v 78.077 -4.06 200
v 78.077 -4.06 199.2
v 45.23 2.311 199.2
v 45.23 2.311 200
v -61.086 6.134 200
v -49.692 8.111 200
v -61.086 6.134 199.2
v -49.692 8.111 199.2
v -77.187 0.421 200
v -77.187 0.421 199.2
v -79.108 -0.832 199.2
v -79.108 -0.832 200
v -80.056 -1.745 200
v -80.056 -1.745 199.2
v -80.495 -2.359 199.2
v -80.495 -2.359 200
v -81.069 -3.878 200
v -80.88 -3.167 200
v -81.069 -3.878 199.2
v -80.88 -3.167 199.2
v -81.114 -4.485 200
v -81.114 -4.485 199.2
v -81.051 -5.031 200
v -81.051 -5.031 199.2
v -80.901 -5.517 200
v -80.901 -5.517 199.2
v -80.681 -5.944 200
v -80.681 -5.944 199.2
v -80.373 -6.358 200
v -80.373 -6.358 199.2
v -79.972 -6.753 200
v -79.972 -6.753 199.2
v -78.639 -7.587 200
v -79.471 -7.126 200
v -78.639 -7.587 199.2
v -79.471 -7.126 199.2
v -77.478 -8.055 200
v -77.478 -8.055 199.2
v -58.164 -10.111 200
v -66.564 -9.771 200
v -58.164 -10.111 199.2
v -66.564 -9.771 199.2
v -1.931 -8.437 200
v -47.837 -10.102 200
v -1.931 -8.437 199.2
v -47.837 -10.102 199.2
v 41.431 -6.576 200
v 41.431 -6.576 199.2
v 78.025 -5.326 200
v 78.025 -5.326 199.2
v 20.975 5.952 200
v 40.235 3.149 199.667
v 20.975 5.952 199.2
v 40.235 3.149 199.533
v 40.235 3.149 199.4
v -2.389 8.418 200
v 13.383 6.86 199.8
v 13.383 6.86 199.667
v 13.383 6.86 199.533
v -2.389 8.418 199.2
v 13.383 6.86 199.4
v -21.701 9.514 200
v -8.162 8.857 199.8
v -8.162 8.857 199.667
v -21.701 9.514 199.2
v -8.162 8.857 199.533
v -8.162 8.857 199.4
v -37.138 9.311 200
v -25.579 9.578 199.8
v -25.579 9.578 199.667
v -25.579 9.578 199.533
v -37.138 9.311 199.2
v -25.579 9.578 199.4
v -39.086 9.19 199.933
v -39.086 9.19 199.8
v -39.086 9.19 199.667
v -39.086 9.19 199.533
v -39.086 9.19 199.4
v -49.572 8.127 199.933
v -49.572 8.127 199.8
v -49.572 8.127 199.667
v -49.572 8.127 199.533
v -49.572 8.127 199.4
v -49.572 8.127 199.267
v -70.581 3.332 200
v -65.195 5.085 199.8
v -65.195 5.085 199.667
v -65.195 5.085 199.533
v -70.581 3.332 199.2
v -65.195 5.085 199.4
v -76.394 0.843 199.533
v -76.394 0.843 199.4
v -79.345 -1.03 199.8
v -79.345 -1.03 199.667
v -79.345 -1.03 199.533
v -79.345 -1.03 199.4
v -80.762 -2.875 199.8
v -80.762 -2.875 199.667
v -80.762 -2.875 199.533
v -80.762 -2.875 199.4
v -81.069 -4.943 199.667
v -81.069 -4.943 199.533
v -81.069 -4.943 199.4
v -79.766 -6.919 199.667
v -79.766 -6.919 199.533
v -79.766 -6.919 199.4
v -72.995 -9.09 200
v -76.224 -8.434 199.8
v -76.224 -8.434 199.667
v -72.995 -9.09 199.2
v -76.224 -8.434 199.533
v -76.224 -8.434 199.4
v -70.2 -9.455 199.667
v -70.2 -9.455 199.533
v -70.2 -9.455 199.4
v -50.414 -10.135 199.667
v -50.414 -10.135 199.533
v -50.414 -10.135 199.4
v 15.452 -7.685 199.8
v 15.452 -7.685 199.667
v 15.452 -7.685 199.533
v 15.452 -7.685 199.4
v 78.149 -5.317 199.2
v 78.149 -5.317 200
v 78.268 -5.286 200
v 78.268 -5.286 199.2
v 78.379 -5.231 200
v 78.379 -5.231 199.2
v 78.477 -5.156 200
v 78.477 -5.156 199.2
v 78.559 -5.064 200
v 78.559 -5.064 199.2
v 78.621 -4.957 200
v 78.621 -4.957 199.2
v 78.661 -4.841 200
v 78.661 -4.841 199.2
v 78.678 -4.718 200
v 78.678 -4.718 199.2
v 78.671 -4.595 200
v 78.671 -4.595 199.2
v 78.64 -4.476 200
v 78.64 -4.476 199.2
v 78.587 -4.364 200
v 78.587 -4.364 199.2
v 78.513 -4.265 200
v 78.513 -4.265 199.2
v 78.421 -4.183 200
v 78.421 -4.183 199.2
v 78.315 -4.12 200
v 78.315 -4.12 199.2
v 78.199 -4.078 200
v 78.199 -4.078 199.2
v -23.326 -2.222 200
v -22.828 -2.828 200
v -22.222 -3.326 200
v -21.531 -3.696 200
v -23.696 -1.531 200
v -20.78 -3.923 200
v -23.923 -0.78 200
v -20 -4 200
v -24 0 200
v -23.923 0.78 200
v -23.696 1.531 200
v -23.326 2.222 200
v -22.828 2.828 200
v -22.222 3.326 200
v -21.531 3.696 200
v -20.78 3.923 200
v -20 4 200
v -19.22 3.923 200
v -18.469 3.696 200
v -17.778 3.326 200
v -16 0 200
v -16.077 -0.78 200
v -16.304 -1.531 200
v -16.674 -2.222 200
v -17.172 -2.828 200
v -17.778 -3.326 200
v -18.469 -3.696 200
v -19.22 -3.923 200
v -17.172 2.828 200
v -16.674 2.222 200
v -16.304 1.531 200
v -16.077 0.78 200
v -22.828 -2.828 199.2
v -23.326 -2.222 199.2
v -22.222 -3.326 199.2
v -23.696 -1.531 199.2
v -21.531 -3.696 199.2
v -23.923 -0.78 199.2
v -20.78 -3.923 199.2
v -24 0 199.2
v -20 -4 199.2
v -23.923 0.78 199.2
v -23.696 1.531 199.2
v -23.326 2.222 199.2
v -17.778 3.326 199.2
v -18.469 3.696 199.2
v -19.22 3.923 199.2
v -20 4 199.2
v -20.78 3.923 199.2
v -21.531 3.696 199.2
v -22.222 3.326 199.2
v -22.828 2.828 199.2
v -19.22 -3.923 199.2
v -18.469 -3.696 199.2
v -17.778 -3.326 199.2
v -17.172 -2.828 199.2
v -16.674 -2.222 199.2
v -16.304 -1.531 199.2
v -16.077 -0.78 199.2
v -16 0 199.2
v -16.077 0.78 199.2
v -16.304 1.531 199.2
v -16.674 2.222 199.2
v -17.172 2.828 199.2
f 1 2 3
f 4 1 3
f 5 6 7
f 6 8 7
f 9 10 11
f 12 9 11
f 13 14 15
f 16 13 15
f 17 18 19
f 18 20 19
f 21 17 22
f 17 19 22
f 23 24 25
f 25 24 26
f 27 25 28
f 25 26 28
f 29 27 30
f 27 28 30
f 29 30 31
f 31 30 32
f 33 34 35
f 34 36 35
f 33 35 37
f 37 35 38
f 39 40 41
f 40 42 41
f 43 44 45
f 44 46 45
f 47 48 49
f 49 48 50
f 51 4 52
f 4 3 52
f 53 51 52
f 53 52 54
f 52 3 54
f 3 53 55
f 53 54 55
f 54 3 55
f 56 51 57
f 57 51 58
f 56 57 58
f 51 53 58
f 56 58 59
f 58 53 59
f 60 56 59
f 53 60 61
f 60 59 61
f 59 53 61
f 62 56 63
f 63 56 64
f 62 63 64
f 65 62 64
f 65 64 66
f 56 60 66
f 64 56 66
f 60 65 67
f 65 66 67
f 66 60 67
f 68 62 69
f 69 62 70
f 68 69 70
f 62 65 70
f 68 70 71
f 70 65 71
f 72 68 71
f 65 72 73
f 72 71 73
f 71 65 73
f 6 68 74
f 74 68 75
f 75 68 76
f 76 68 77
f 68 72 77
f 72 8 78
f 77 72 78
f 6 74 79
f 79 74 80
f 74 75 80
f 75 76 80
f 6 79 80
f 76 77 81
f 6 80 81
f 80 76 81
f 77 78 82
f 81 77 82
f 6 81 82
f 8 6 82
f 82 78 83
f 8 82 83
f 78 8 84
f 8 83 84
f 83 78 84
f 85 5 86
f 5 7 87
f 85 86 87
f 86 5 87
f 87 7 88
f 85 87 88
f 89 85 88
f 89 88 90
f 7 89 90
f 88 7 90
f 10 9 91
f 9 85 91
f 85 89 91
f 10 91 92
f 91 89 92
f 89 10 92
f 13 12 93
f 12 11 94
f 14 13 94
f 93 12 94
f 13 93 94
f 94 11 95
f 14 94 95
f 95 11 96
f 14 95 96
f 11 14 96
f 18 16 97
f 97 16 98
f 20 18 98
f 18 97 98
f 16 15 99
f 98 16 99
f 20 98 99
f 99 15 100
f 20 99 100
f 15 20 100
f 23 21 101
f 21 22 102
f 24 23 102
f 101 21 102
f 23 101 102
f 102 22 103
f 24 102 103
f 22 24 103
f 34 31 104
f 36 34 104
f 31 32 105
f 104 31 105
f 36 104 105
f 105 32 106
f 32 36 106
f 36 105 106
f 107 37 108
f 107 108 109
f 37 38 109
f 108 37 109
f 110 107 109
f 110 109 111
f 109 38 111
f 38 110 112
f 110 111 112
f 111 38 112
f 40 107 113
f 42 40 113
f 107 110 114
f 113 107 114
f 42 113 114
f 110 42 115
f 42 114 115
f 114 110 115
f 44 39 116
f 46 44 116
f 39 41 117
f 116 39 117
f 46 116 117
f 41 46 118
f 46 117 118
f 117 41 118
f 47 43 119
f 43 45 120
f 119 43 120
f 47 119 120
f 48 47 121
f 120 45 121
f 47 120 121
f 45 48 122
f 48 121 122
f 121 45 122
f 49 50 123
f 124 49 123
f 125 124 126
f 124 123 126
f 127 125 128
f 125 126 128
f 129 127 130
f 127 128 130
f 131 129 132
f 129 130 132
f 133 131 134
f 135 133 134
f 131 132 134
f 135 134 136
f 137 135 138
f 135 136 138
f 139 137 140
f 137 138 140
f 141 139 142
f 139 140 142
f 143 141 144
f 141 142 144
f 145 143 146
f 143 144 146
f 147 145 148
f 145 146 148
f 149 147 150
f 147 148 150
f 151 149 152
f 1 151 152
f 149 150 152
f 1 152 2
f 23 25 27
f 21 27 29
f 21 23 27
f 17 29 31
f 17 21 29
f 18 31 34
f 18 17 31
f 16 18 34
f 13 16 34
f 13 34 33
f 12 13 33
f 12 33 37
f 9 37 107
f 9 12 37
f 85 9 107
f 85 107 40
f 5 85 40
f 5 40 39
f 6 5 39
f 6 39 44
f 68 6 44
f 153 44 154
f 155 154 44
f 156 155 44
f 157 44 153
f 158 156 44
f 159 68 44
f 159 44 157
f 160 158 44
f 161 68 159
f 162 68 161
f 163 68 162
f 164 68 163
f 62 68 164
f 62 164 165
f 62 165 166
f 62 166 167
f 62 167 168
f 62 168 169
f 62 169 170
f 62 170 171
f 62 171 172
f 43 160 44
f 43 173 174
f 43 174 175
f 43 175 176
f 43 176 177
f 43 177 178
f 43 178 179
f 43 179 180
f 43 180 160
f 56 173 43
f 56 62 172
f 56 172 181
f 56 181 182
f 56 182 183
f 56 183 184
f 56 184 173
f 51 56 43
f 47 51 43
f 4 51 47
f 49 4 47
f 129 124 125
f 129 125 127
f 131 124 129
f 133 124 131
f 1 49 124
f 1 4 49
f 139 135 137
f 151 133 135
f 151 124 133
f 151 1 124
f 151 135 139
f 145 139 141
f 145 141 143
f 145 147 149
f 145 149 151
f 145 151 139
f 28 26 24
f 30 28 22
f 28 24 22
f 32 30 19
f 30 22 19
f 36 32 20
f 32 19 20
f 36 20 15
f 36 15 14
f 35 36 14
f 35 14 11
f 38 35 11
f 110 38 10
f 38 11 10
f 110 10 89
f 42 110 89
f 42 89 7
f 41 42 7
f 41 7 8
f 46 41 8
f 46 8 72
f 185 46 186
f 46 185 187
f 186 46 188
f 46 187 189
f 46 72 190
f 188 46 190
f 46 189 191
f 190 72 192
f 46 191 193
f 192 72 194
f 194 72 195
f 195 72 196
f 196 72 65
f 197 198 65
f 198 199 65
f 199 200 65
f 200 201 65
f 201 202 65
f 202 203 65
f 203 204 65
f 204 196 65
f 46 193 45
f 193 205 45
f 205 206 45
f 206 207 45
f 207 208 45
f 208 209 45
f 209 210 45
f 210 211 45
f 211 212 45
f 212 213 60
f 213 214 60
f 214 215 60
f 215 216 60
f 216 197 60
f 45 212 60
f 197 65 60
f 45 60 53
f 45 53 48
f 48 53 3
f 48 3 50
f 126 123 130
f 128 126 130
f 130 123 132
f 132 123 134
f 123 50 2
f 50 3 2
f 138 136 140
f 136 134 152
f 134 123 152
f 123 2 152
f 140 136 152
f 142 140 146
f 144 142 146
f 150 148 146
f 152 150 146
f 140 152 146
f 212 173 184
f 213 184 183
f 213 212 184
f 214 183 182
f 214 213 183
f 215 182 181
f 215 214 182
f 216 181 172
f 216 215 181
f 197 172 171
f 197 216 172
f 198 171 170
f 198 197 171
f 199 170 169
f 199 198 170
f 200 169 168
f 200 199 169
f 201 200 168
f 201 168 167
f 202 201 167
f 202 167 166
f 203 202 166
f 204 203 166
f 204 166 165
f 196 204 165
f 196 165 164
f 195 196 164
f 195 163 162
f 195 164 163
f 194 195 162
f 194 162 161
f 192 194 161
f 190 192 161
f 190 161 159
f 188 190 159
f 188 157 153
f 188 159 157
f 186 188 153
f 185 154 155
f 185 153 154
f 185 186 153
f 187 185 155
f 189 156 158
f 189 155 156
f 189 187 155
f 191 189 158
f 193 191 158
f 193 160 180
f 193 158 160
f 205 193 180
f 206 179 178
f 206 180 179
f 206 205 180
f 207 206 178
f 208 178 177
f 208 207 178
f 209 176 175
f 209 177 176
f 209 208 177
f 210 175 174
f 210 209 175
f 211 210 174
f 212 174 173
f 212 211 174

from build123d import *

# Parameters (mm, degrees)
CYLINDER002_R     = 4
CYLINDER002_DEPTH = 200
PAD004_DEPTH      = 0.8


with BuildPart() as cylinder002:
    # Cylinder002 → Cylinder002 (new body)
    with BuildSketch(Plane(origin=(-20, 0, 0), x_dir=(1, 0, 0), z_dir=(0, 0, 1))):
        Circle(CYLINDER002_R)
    extrude(amount=CYLINDER002_DEPTH)


with BuildPart() as cut002:
    # Sketch004 → Pad004 (new body)
    with BuildSketch(Plane.XY):
        with BuildLine():
            ThreePointArc((78.025462, -5.32552), (78.678238, -4.71833), (78.0769, -4.06016))
            add(Edge.make_bspline(
                [(78.0769, -4.06016), (47.672159, 2.38352), (10.59684, 7.778451), (-28.297692, 10.361855), (-50.88127, 8.243014), (-65.60959, 5.425443), (-77.851781, 0.565965), (-81.349465, -2.633806), (-81.324572, -7.281758), (-71.951108, -9.750339), (-52.073376, -10.445609), (-22.240417, -9.278015), (14.022003, -7.792926), (43.916426, -6.370697), (78.025462, -5.32552)],
                knots=[0, 0, 0, 0, 0.083333, 0.166667, 0.25, 0.333333, 0.416667, 0.5, 0.583333, 0.666667, 0.75, 0.833333, 0.916667, 1, 1, 1, 1], degree=3))
        make_face()
    extrude(amount=PAD004_DEPTH)

    # Cut002: cut Cylinder002
    add(cylinder002.part, mode=Mode.SUBTRACT)


with BuildPart() as cut002_1:
    # Cut002 placement: moved
    add(cut002.part.moved(Location((0, 0, 199.2))))


solid = cut002_1.part
